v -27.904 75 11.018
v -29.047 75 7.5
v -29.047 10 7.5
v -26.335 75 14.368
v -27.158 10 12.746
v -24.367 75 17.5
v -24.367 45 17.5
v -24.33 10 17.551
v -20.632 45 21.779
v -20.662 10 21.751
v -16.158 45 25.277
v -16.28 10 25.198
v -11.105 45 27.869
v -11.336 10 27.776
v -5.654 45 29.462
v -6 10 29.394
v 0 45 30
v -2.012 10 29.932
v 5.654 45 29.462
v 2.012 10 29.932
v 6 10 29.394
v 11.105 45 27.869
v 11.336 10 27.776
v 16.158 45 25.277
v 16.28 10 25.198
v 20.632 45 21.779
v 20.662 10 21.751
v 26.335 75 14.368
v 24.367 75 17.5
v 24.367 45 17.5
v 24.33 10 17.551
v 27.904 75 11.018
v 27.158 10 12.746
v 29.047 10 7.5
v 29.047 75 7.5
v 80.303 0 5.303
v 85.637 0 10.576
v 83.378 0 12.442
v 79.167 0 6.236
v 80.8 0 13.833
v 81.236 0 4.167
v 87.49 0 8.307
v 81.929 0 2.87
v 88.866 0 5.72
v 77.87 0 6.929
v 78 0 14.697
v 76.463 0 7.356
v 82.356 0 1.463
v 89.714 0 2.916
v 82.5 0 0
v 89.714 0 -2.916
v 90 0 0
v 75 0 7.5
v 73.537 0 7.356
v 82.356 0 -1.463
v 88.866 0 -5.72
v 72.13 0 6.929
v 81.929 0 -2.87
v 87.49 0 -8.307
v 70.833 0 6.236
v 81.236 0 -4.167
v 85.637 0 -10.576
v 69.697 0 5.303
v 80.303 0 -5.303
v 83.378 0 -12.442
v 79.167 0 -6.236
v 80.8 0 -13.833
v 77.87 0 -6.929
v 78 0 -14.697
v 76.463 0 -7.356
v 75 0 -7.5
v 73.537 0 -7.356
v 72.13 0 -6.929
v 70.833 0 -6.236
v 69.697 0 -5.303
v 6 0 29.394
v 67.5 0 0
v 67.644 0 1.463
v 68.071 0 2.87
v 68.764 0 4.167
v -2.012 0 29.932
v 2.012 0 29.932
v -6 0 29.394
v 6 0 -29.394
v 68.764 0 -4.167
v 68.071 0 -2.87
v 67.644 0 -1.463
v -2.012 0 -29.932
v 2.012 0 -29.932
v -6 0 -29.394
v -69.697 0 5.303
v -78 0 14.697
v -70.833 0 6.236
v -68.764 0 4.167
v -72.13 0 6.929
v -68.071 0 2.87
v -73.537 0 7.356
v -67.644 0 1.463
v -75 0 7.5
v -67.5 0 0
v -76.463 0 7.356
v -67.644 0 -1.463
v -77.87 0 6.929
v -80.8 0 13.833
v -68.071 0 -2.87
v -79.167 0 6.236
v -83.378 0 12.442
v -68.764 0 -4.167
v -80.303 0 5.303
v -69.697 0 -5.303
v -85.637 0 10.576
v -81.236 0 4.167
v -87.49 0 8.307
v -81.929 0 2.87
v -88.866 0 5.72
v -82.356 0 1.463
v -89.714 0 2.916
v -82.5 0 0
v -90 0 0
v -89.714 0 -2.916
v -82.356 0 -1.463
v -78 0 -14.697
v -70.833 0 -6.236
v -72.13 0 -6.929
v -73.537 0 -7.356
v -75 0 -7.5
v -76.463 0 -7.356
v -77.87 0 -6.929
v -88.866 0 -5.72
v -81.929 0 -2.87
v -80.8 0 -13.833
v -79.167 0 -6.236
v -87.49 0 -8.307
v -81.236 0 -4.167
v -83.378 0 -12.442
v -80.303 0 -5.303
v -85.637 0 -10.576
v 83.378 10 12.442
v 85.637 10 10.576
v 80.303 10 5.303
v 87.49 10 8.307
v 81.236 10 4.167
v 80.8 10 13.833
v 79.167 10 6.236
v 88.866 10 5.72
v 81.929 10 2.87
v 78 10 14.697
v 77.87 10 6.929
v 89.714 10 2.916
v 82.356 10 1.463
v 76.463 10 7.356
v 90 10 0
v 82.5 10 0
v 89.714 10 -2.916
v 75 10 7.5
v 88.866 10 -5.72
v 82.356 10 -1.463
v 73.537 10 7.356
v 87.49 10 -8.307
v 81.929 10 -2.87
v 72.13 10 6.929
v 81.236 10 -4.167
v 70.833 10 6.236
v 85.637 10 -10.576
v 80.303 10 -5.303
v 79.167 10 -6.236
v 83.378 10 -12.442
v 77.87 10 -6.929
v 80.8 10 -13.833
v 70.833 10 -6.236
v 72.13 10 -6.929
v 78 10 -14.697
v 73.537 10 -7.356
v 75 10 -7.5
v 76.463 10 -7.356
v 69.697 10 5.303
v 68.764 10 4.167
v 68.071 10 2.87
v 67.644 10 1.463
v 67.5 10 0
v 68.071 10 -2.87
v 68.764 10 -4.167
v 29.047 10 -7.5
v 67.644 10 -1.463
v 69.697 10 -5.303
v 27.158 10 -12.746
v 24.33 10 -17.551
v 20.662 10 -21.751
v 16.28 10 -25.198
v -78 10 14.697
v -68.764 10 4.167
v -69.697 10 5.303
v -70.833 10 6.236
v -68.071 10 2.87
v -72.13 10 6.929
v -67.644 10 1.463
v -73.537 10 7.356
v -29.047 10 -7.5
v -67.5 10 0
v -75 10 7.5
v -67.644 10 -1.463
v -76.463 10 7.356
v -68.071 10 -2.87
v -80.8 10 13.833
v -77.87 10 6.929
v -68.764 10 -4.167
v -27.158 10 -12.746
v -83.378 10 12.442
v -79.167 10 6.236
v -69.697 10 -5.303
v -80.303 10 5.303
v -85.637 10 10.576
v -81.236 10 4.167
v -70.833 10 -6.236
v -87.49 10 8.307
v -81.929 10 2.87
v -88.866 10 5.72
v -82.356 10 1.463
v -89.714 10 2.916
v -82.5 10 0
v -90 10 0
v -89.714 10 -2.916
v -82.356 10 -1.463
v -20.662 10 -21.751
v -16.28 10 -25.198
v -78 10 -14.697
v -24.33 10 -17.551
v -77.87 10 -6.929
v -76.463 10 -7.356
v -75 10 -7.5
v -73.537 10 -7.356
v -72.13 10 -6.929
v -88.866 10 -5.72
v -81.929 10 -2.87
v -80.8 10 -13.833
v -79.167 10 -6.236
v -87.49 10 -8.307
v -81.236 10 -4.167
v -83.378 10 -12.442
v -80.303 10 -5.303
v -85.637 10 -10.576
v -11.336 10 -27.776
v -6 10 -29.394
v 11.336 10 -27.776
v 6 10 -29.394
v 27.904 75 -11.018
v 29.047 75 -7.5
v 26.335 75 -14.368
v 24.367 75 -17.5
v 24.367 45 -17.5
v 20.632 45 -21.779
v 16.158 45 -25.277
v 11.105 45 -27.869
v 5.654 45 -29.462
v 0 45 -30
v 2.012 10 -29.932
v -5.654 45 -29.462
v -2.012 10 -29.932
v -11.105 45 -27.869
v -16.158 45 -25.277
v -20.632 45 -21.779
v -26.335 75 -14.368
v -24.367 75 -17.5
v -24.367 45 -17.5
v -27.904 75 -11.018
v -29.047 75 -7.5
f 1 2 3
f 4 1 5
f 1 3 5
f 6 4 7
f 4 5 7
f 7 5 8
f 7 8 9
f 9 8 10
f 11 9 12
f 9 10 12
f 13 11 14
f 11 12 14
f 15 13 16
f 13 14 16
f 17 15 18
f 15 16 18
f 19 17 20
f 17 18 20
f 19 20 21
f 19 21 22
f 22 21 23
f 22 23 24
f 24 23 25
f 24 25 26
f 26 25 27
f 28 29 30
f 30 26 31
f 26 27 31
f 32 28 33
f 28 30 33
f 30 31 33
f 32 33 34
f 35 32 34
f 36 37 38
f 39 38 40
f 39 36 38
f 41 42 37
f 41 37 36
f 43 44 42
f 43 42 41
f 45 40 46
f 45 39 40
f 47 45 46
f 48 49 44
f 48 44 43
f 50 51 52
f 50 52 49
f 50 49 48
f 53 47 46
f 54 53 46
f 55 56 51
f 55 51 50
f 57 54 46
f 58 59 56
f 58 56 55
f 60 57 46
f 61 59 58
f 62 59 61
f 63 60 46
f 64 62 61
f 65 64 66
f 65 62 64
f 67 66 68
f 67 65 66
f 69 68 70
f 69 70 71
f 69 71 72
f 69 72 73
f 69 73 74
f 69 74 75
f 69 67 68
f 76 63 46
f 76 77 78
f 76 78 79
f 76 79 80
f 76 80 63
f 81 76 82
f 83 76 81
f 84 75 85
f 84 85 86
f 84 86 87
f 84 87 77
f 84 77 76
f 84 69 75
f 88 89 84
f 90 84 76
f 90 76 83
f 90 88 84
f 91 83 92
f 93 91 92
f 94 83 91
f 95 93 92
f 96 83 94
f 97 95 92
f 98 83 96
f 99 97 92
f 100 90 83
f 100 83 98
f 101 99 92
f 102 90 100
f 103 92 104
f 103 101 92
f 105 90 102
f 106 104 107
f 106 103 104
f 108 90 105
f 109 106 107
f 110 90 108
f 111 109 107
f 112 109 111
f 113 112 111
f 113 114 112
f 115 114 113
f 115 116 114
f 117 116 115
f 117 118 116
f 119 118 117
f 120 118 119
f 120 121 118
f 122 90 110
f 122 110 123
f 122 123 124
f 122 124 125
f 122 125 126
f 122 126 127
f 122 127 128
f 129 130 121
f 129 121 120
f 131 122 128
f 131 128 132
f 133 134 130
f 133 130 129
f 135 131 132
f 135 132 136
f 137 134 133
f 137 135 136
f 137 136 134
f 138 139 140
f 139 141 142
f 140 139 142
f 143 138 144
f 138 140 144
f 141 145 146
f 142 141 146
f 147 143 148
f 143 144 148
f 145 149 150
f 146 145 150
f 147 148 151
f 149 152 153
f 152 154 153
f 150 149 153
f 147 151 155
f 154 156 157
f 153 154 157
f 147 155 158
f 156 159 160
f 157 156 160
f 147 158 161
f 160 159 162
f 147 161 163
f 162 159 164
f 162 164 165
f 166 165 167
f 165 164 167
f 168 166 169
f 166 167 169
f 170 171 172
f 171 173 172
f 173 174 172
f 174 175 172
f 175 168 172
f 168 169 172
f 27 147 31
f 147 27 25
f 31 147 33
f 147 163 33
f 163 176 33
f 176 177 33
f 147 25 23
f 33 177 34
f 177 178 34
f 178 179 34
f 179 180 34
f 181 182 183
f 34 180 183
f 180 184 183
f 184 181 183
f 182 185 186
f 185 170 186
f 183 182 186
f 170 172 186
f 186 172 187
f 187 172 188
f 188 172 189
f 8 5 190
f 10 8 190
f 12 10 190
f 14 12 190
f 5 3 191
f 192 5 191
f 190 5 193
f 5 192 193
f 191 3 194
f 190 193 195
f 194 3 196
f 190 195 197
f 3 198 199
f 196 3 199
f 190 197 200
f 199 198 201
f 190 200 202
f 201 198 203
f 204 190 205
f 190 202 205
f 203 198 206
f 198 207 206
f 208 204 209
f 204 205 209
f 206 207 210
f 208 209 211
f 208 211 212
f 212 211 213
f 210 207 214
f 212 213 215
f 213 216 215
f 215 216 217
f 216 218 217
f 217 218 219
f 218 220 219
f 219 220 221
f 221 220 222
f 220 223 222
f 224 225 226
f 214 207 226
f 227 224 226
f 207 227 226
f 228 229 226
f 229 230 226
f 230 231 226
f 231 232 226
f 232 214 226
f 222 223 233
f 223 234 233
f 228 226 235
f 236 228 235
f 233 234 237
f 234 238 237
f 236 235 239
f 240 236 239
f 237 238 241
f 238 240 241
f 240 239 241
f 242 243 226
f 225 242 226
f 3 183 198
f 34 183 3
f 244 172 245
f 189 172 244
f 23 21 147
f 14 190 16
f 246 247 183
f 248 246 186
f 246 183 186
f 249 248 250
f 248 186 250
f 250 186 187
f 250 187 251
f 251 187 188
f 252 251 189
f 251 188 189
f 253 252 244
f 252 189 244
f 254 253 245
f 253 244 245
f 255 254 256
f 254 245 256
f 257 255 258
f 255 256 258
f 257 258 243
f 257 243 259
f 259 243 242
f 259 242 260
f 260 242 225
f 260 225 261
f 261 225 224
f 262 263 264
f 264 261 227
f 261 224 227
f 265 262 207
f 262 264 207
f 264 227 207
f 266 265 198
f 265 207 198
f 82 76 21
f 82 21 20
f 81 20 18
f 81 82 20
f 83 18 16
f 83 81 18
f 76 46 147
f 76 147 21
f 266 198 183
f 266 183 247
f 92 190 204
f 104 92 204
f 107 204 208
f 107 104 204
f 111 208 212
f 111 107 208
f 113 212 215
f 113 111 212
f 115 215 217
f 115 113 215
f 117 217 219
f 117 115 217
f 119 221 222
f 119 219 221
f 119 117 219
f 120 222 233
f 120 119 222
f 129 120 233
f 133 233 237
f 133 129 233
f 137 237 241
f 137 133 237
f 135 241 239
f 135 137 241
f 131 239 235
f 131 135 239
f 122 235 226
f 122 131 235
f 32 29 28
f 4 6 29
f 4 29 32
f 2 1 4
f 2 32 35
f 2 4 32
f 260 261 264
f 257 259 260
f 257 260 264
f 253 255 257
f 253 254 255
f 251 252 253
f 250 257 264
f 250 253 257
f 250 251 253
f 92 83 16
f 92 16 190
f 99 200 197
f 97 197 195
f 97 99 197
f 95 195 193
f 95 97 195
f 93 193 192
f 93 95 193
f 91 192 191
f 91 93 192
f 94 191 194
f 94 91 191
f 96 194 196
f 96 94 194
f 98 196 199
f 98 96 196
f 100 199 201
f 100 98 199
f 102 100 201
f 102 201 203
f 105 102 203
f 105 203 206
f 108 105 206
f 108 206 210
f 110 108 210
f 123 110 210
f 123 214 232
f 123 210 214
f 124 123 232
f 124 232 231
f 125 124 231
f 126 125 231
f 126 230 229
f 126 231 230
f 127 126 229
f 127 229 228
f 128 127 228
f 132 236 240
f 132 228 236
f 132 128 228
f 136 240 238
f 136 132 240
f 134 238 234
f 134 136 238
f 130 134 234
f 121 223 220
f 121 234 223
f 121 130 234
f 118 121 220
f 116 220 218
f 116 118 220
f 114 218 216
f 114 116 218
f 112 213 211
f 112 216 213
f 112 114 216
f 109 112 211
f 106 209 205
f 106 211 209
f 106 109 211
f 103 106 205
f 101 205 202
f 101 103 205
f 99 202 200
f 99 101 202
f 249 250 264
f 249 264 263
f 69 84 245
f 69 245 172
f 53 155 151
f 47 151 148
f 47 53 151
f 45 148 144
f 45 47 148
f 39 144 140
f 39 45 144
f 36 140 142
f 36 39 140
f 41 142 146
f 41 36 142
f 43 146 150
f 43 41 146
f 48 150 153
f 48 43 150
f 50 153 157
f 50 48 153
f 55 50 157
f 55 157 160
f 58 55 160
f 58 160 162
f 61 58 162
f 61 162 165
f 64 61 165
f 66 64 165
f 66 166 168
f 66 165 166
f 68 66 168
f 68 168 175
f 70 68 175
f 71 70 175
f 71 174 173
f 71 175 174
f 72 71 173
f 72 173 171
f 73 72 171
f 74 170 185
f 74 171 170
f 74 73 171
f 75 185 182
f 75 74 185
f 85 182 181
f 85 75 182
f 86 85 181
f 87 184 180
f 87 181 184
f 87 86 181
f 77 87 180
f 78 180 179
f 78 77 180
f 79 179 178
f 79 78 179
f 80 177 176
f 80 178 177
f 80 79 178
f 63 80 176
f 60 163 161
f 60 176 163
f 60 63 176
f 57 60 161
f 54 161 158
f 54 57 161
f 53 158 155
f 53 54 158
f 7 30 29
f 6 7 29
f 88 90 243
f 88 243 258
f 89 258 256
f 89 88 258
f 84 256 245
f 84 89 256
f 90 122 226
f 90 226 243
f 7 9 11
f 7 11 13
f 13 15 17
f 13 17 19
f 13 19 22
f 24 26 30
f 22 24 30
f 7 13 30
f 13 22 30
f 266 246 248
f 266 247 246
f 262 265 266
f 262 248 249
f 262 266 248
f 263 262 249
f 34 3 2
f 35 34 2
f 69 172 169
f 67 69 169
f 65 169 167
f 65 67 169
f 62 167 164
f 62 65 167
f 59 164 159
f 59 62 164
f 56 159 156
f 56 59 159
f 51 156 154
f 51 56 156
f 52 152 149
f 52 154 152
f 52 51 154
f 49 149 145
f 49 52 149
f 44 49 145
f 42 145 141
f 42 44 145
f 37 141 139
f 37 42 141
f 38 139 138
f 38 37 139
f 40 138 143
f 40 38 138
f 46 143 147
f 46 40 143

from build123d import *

# Parameters (mm, degrees)
SKETCH1_R               = 7.5
BOSS_EXTRUDE1_DEPTH     = 10
SKETCH2_R               = 30
BOSS_EXTRUDE2_DEPTH     = 65
CUT_EXTRUDE1_DEPTH      = 121.933866224
CUT_EXTRUDE1_DEPTH_BACK = 121.933866224
SKETCH3_W               = 15
SKETCH3_H               = 65
SKETCH5_W               = 12.5
SKETCH5_H               = 30
CUT_EXTRUDE2_DEPTH      = 121.933866224


with BuildPart() as part:
    # Sketch1 → Boss-Extrude1 (new body)
    with BuildSketch(Plane(origin=(0, 0, 0), x_dir=(1, 0, 0), z_dir=(0, 1, 0))):
        with BuildLine():
            Line((6, 29.393876913), (78, 14.696938457))
            ThreePointArc((78, 14.696938457), (90, 0), (78, -14.696938457))
            Line((78, -14.696938457), (6, -29.393876913))
            ThreePointArc((6, -29.393876913), (0, -30), (-6, -29.393876913))
            Line((-6, -29.393876913), (-78, -14.696938457))
            ThreePointArc((-78, -14.696938457), (-90, 0), (-78, 14.696938457))
            Line((-78, 14.696938457), (-6, 29.393876913))
            ThreePointArc((-6, 29.393876913), (0, 30), (6, 29.393876913))
        make_face()
        with Locations(Location((-75, 0, 0), (0, 0, 270))):
            Circle(SKETCH1_R, mode=Mode.SUBTRACT)
        with Locations(Location((75, 0, 0), (0, 0, 270))):
            Circle(SKETCH1_R, mode=Mode.SUBTRACT)
    extrude(amount=BOSS_EXTRUDE1_DEPTH)

    # Sketch2 → Boss-Extrude2 (add)
    with BuildSketch(Plane(origin=(0, 10, 0), x_dir=(1, 0, 0), z_dir=(0, 1, 0))):
        with Locations(Location((0, 0, 0), (0, 0, 78.463040967))):
            Circle(SKETCH2_R)
    extrude(amount=BOSS_EXTRUDE2_DEPTH)

    # Sketch3 → Cut-Extrude1 (cut, two sides: drawn at the far end of the back side and taken through both)
    with BuildSketch(Plane(origin=(0, 0, 0), x_dir=(0, 0, -1), z_dir=(1, 0, 0)).offset(-CUT_EXTRUDE1_DEPTH_BACK)):
        with Locations((0, 42.5)):
            Rectangle(SKETCH3_W, SKETCH3_H)
    extrude(amount=CUT_EXTRUDE1_DEPTH + CUT_EXTRUDE1_DEPTH_BACK, mode=Mode.SUBTRACT)

    # Sketch5 → Cut-Extrude2 (cut, symmetric)
    with BuildSketch(Plane(origin=(0, 0, 0), x_dir=(0, 0, -1), z_dir=(1, 0, 0))):
        with Locations((-23.75, 60)):
            Rectangle(SKETCH5_W, SKETCH5_H)
    cut_extrude2 = extrude(amount=CUT_EXTRUDE2_DEPTH, both=True, mode=Mode.SUBTRACT)

    # Mirror1: Cut-Extrude2 across plane
    add(cut_extrude2.mirror(Plane.XY), mode=Mode.SUBTRACT)


solid = part.part
